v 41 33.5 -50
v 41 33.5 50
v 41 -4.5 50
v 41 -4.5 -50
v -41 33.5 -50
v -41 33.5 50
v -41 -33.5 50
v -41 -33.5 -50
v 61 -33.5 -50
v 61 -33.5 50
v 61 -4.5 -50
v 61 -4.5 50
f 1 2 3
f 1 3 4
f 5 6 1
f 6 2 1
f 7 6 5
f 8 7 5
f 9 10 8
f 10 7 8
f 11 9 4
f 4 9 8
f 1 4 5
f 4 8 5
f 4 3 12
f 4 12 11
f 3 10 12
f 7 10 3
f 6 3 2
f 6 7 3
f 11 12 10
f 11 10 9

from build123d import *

# Parameters (mm, degrees)
SKETCH_1_W      = 100
SKETCH_1_H      = 67
EXTRUDE_1_DEPTH = 41
SKETCH_2_W      = 100
SKETCH_2_H      = 29
EXTRUDE_2_DEPTH = 20


with BuildPart() as part:
    # 草图1 → 凸台-拉伸1 (new, symmetric)
    with BuildSketch(Plane(origin=(0, 0, 0), x_dir=(0, 0, -1), z_dir=(1, 0, 0))):
        Rectangle(SKETCH_1_W, SKETCH_1_H)
    extrude(amount=EXTRUDE_1_DEPTH, both=True)

    # 草图2 → 凸台-拉伸2 (add)
    with BuildSketch(Plane(origin=(41, 0, 0), x_dir=(0, 0, -1), z_dir=(1, 0, 0))):
        with Locations((0, -19)):
            Rectangle(SKETCH_2_W, SKETCH_2_H)
    extrude(amount=EXTRUDE_2_DEPTH)


solid = part.part
